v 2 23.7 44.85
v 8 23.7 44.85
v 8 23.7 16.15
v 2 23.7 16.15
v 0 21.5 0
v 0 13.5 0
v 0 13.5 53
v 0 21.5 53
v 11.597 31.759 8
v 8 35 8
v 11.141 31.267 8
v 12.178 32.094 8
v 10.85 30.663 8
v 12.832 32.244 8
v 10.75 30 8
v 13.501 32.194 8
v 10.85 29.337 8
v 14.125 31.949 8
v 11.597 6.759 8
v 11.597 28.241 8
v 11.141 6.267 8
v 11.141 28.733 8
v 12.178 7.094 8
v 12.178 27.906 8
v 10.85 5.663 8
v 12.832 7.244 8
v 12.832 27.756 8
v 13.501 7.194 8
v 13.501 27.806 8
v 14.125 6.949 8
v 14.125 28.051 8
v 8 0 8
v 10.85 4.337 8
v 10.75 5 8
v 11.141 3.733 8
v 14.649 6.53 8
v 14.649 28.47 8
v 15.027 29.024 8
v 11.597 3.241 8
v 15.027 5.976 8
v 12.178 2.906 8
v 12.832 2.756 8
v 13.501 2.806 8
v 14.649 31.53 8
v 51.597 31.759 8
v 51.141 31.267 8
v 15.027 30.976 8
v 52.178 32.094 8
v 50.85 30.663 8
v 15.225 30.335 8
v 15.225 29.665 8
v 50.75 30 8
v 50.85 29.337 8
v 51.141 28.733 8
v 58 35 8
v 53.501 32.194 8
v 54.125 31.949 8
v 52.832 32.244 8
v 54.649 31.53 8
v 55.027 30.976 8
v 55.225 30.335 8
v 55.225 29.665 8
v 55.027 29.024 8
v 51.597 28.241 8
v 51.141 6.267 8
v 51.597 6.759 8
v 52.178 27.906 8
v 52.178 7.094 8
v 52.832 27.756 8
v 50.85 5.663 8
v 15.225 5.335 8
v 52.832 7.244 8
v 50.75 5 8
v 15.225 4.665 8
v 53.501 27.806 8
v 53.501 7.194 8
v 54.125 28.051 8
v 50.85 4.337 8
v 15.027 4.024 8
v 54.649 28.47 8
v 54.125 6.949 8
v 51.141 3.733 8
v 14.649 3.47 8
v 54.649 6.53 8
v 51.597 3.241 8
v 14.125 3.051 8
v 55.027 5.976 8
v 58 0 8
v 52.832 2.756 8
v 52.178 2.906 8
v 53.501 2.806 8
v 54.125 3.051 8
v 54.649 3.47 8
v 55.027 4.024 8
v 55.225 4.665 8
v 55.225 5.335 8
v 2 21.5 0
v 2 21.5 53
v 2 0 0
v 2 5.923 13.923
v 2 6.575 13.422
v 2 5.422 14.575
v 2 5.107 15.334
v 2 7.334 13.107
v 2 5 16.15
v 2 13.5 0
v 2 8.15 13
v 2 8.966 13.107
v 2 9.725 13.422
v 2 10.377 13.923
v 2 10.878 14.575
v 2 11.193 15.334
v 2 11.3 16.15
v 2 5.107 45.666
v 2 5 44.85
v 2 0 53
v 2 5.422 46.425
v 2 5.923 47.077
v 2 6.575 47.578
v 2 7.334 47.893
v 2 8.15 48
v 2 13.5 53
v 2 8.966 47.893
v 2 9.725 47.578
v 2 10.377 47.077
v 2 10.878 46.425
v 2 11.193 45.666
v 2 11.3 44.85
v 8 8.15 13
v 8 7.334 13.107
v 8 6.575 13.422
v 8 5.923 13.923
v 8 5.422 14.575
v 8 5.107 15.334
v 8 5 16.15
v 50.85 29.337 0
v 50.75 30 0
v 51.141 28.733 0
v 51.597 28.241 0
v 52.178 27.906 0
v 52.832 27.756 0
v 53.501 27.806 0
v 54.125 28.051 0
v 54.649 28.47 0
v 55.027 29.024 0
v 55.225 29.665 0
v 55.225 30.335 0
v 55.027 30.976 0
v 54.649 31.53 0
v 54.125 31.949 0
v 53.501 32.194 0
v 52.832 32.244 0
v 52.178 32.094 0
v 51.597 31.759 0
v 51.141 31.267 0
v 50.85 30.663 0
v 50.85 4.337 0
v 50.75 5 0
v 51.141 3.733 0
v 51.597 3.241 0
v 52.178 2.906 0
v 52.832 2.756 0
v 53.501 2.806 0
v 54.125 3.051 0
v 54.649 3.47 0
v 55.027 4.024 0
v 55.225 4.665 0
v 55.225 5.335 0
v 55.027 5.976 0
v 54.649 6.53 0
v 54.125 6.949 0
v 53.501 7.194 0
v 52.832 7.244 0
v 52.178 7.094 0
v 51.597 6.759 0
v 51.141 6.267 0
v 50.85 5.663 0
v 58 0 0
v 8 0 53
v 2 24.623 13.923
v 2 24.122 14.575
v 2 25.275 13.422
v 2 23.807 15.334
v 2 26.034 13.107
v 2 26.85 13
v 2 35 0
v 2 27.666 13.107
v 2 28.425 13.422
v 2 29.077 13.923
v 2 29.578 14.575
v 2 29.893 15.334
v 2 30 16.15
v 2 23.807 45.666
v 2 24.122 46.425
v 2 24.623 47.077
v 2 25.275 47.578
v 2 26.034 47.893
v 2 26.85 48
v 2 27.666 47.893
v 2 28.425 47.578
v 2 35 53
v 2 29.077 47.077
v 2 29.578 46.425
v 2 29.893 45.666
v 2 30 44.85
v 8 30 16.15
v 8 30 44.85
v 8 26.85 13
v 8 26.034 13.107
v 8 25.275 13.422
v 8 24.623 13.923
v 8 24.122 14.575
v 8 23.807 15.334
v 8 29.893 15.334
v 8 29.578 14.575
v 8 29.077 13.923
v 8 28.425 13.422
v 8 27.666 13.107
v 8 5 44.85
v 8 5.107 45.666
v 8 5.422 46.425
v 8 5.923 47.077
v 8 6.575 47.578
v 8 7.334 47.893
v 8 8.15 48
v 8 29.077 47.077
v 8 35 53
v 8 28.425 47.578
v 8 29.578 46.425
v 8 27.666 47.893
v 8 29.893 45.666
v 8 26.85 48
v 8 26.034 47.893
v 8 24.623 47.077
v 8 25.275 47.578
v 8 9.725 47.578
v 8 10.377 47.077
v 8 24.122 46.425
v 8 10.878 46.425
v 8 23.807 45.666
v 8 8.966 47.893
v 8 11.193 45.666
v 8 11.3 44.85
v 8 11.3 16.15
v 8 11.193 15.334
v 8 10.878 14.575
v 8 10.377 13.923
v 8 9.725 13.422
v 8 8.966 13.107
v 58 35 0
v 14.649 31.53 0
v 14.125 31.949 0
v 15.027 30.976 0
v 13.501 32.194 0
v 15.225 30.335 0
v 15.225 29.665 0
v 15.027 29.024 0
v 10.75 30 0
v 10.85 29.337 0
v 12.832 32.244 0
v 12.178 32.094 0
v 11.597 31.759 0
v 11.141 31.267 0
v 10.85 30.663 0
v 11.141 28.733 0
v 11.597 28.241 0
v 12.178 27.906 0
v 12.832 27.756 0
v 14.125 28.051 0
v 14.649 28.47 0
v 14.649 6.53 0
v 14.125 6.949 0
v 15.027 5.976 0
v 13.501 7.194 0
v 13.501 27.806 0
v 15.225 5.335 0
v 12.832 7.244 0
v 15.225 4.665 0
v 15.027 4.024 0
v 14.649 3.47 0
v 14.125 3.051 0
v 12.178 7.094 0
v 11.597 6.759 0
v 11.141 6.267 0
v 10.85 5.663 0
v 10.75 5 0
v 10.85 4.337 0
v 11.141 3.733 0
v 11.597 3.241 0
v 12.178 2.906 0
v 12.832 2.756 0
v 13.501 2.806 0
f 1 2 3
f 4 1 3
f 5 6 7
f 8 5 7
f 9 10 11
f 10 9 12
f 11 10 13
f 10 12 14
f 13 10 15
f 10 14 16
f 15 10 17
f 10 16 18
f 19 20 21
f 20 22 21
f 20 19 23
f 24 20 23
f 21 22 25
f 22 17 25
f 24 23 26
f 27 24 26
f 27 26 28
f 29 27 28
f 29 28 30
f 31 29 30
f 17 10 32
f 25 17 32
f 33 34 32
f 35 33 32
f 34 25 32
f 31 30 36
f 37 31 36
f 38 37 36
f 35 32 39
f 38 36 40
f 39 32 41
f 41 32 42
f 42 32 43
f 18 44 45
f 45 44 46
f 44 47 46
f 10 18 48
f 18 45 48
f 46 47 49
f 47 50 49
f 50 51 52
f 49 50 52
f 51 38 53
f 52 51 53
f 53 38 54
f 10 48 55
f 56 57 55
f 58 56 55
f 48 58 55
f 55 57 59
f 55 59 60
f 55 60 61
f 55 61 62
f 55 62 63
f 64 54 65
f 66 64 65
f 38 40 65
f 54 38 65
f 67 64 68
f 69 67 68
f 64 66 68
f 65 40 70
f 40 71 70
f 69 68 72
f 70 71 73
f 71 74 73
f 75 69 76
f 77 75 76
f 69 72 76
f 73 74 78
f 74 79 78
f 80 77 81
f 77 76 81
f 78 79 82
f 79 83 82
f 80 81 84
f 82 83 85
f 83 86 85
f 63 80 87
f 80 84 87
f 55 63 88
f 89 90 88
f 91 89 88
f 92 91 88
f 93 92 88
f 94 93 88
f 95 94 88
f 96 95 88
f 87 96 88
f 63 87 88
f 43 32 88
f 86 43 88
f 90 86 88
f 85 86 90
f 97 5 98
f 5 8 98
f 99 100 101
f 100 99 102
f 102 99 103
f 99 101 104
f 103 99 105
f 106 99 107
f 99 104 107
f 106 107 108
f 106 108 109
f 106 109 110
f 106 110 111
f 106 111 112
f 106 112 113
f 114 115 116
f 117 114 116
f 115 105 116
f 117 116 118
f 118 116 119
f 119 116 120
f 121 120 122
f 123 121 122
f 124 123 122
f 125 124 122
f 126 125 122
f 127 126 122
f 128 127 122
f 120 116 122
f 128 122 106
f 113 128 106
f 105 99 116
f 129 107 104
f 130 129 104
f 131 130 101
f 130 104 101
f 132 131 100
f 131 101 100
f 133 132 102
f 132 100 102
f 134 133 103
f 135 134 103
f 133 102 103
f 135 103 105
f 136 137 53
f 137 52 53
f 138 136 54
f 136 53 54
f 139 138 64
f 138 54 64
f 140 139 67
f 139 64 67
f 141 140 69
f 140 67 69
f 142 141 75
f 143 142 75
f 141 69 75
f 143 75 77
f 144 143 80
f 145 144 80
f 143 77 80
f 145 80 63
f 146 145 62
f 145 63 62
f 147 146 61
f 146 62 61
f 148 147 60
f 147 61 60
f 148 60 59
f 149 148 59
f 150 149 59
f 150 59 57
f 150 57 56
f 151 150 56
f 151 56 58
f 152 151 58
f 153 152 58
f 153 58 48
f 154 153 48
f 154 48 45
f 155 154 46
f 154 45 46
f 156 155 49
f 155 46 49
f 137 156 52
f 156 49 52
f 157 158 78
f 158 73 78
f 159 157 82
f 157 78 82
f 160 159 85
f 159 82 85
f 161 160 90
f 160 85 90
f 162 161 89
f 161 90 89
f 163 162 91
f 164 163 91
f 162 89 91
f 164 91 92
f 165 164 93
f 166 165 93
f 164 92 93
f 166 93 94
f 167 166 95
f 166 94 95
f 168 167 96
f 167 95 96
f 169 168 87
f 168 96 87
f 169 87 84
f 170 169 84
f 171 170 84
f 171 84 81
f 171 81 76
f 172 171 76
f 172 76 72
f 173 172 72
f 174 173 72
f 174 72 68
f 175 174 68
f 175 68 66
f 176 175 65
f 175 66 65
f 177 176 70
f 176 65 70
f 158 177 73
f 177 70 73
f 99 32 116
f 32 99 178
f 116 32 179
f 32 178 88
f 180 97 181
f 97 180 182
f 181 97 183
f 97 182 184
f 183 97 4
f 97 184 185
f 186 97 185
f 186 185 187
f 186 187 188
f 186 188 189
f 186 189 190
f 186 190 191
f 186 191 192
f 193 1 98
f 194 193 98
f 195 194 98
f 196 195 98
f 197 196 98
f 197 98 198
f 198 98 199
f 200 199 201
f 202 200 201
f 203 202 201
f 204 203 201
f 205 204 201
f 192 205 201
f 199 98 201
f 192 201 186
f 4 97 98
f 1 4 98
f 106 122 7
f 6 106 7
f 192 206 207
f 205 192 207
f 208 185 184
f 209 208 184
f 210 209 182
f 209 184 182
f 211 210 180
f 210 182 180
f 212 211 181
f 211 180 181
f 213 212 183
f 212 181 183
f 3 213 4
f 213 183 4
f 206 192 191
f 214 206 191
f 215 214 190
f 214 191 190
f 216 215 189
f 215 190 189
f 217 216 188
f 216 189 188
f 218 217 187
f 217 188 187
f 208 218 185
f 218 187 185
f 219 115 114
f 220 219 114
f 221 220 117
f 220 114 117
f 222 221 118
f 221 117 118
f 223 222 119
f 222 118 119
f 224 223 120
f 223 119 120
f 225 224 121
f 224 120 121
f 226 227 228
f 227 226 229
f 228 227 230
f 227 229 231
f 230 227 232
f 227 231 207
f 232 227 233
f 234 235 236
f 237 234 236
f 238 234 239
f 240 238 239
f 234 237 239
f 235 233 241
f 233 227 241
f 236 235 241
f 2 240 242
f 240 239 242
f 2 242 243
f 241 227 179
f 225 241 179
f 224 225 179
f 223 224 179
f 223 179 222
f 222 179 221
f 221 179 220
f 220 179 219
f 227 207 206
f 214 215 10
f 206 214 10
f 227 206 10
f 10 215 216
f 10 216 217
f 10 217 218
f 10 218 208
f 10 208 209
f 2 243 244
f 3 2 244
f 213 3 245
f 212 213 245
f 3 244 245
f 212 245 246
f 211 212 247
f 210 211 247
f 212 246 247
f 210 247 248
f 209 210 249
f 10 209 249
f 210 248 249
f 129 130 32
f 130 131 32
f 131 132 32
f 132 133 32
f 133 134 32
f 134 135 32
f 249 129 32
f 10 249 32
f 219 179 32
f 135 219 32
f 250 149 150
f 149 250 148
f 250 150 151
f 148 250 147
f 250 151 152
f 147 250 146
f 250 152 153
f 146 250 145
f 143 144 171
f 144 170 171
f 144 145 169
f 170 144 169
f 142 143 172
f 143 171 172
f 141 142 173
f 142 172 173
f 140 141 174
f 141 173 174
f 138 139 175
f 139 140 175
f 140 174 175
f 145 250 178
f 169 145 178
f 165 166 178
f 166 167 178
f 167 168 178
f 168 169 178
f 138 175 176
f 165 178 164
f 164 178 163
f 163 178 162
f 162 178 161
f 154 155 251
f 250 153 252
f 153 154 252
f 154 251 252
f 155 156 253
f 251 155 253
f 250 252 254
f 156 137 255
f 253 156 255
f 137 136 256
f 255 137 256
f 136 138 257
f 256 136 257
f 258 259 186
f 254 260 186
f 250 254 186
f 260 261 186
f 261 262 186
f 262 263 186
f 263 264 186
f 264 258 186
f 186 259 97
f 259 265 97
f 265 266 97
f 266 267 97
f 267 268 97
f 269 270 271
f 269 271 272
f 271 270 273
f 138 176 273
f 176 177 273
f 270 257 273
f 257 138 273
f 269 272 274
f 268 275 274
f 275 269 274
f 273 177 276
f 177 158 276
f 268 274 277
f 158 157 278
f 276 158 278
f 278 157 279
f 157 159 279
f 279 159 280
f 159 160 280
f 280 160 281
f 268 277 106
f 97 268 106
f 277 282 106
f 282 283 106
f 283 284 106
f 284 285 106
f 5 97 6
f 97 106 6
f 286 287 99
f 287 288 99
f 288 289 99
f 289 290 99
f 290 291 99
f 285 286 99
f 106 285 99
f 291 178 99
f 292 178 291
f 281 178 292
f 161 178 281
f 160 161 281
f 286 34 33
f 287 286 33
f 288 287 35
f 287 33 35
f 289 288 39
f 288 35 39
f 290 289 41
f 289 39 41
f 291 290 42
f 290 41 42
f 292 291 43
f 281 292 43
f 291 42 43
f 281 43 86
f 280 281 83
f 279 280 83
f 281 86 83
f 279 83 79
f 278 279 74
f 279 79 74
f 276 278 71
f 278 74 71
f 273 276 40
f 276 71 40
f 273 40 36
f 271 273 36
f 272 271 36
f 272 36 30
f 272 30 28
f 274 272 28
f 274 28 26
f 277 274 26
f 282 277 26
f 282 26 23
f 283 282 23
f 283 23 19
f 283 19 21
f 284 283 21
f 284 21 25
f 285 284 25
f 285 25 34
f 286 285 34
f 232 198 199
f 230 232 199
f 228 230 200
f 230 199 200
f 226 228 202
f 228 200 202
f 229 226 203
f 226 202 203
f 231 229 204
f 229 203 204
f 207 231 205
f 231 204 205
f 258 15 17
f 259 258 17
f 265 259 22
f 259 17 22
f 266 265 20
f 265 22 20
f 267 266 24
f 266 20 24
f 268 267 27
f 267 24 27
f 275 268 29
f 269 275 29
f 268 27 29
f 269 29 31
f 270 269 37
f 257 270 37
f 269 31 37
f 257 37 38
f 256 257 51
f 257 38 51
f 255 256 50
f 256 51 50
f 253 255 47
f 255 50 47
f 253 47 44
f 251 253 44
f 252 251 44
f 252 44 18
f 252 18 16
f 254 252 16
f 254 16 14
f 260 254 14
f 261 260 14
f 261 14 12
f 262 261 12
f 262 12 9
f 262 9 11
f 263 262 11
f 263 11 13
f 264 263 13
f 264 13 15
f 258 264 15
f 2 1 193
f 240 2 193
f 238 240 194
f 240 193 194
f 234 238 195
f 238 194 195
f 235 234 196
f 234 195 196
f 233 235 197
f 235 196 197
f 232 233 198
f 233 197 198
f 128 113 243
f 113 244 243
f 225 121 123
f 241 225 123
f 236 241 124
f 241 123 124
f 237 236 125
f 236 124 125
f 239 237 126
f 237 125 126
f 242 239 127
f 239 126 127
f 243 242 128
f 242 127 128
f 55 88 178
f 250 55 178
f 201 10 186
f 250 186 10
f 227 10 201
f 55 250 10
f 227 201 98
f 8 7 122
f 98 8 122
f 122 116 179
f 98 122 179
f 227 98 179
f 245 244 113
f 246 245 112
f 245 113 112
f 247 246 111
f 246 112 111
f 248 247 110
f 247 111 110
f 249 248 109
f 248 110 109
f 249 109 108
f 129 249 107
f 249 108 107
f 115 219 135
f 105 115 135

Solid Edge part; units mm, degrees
sketch "Sketch1" plane through (0, 0, 0) normal (0, -1, 0) x (1, 0, 0)
  line L0 (8, 53) -> (8, 8)
  line L1 (8, 8) -> (58, 8)
  line L2 (58, 8) -> (58, 0)
  line L3 (58, 0) -> (0, 0)
  line L4 (0, 0) -> (0, 53)
  line L5 (0, 53) -> (8, 53)
extrude "Extrusionsausprägung_16" add sketch "Sketch1" against normal blind 35
sketch "Sketch2" plane through (39, 25, 8) normal (0, 0, 1) x (-1, 0, 0)
  circle A0 centre (26, 20) radius 2.25
  circle A1 centre (-14, 20) radius 2.25
  circle A2 centre (-14, -5) radius 2.25
  circle A3 centre (26, -5) radius 2.25
  dimension "D1" = 5
  dimension "D2" = 5
  dimension "D3" = 4.5
  dimension "D4" = 40
  dimension "D5" = 25
extrude "Extrusionsausschnitt_23" cut sketch "Sketch2" against normal blind 79.6572
extrude "Cutout1" [suppressed]
sketch "Sketch3" plane through (8, 17.5, 29) normal (1, 0, 0) x (0, 0, 1)
  line L0 (19, 12.5) -> (-16, 12.5)
  line L1 (-16, 12.5) -> (-16, 6.2)
  line L2 (-16, 6.2) -> (19, 6.2)
  line L3 (19, 6.2) -> (19, 12.5)
extrude "Extrusionsausschnitt_25" cut sketch "Sketch3" against normal blind 90.2255
fillet "Verrundung_15" radius 3.15 4 edges at (4, 11.3, 13) (4, 5, 13) (4, 5, 48) (4, 11.3, 48)
mirror "Mirror1" about plane through (29, 17.5, 25) normal (0, -1, 0) of "Extrusionsausschnitt_25", "Verrundung_15"
sketch "Sketch4" plane through (4, 17.5, 53) normal (0, 0, 1) x (-1, 0, 0)
  line L0 (2, 17.5) -> (2, 4)
  line L1 (2, 4) -> (4, 4)
  line L2 (4, 4) -> (4, 17.5)
  line L3 (4, 17.5) -> (2, 17.5)
extrude "Extrusionsausschnitt_26" cut sketch "Sketch4" against normal blind 65.9073
mirror "Mirror2" about plane through (29, 17.5, 25) normal (0, -1, 0) of "Extrusionsausschnitt_26"
